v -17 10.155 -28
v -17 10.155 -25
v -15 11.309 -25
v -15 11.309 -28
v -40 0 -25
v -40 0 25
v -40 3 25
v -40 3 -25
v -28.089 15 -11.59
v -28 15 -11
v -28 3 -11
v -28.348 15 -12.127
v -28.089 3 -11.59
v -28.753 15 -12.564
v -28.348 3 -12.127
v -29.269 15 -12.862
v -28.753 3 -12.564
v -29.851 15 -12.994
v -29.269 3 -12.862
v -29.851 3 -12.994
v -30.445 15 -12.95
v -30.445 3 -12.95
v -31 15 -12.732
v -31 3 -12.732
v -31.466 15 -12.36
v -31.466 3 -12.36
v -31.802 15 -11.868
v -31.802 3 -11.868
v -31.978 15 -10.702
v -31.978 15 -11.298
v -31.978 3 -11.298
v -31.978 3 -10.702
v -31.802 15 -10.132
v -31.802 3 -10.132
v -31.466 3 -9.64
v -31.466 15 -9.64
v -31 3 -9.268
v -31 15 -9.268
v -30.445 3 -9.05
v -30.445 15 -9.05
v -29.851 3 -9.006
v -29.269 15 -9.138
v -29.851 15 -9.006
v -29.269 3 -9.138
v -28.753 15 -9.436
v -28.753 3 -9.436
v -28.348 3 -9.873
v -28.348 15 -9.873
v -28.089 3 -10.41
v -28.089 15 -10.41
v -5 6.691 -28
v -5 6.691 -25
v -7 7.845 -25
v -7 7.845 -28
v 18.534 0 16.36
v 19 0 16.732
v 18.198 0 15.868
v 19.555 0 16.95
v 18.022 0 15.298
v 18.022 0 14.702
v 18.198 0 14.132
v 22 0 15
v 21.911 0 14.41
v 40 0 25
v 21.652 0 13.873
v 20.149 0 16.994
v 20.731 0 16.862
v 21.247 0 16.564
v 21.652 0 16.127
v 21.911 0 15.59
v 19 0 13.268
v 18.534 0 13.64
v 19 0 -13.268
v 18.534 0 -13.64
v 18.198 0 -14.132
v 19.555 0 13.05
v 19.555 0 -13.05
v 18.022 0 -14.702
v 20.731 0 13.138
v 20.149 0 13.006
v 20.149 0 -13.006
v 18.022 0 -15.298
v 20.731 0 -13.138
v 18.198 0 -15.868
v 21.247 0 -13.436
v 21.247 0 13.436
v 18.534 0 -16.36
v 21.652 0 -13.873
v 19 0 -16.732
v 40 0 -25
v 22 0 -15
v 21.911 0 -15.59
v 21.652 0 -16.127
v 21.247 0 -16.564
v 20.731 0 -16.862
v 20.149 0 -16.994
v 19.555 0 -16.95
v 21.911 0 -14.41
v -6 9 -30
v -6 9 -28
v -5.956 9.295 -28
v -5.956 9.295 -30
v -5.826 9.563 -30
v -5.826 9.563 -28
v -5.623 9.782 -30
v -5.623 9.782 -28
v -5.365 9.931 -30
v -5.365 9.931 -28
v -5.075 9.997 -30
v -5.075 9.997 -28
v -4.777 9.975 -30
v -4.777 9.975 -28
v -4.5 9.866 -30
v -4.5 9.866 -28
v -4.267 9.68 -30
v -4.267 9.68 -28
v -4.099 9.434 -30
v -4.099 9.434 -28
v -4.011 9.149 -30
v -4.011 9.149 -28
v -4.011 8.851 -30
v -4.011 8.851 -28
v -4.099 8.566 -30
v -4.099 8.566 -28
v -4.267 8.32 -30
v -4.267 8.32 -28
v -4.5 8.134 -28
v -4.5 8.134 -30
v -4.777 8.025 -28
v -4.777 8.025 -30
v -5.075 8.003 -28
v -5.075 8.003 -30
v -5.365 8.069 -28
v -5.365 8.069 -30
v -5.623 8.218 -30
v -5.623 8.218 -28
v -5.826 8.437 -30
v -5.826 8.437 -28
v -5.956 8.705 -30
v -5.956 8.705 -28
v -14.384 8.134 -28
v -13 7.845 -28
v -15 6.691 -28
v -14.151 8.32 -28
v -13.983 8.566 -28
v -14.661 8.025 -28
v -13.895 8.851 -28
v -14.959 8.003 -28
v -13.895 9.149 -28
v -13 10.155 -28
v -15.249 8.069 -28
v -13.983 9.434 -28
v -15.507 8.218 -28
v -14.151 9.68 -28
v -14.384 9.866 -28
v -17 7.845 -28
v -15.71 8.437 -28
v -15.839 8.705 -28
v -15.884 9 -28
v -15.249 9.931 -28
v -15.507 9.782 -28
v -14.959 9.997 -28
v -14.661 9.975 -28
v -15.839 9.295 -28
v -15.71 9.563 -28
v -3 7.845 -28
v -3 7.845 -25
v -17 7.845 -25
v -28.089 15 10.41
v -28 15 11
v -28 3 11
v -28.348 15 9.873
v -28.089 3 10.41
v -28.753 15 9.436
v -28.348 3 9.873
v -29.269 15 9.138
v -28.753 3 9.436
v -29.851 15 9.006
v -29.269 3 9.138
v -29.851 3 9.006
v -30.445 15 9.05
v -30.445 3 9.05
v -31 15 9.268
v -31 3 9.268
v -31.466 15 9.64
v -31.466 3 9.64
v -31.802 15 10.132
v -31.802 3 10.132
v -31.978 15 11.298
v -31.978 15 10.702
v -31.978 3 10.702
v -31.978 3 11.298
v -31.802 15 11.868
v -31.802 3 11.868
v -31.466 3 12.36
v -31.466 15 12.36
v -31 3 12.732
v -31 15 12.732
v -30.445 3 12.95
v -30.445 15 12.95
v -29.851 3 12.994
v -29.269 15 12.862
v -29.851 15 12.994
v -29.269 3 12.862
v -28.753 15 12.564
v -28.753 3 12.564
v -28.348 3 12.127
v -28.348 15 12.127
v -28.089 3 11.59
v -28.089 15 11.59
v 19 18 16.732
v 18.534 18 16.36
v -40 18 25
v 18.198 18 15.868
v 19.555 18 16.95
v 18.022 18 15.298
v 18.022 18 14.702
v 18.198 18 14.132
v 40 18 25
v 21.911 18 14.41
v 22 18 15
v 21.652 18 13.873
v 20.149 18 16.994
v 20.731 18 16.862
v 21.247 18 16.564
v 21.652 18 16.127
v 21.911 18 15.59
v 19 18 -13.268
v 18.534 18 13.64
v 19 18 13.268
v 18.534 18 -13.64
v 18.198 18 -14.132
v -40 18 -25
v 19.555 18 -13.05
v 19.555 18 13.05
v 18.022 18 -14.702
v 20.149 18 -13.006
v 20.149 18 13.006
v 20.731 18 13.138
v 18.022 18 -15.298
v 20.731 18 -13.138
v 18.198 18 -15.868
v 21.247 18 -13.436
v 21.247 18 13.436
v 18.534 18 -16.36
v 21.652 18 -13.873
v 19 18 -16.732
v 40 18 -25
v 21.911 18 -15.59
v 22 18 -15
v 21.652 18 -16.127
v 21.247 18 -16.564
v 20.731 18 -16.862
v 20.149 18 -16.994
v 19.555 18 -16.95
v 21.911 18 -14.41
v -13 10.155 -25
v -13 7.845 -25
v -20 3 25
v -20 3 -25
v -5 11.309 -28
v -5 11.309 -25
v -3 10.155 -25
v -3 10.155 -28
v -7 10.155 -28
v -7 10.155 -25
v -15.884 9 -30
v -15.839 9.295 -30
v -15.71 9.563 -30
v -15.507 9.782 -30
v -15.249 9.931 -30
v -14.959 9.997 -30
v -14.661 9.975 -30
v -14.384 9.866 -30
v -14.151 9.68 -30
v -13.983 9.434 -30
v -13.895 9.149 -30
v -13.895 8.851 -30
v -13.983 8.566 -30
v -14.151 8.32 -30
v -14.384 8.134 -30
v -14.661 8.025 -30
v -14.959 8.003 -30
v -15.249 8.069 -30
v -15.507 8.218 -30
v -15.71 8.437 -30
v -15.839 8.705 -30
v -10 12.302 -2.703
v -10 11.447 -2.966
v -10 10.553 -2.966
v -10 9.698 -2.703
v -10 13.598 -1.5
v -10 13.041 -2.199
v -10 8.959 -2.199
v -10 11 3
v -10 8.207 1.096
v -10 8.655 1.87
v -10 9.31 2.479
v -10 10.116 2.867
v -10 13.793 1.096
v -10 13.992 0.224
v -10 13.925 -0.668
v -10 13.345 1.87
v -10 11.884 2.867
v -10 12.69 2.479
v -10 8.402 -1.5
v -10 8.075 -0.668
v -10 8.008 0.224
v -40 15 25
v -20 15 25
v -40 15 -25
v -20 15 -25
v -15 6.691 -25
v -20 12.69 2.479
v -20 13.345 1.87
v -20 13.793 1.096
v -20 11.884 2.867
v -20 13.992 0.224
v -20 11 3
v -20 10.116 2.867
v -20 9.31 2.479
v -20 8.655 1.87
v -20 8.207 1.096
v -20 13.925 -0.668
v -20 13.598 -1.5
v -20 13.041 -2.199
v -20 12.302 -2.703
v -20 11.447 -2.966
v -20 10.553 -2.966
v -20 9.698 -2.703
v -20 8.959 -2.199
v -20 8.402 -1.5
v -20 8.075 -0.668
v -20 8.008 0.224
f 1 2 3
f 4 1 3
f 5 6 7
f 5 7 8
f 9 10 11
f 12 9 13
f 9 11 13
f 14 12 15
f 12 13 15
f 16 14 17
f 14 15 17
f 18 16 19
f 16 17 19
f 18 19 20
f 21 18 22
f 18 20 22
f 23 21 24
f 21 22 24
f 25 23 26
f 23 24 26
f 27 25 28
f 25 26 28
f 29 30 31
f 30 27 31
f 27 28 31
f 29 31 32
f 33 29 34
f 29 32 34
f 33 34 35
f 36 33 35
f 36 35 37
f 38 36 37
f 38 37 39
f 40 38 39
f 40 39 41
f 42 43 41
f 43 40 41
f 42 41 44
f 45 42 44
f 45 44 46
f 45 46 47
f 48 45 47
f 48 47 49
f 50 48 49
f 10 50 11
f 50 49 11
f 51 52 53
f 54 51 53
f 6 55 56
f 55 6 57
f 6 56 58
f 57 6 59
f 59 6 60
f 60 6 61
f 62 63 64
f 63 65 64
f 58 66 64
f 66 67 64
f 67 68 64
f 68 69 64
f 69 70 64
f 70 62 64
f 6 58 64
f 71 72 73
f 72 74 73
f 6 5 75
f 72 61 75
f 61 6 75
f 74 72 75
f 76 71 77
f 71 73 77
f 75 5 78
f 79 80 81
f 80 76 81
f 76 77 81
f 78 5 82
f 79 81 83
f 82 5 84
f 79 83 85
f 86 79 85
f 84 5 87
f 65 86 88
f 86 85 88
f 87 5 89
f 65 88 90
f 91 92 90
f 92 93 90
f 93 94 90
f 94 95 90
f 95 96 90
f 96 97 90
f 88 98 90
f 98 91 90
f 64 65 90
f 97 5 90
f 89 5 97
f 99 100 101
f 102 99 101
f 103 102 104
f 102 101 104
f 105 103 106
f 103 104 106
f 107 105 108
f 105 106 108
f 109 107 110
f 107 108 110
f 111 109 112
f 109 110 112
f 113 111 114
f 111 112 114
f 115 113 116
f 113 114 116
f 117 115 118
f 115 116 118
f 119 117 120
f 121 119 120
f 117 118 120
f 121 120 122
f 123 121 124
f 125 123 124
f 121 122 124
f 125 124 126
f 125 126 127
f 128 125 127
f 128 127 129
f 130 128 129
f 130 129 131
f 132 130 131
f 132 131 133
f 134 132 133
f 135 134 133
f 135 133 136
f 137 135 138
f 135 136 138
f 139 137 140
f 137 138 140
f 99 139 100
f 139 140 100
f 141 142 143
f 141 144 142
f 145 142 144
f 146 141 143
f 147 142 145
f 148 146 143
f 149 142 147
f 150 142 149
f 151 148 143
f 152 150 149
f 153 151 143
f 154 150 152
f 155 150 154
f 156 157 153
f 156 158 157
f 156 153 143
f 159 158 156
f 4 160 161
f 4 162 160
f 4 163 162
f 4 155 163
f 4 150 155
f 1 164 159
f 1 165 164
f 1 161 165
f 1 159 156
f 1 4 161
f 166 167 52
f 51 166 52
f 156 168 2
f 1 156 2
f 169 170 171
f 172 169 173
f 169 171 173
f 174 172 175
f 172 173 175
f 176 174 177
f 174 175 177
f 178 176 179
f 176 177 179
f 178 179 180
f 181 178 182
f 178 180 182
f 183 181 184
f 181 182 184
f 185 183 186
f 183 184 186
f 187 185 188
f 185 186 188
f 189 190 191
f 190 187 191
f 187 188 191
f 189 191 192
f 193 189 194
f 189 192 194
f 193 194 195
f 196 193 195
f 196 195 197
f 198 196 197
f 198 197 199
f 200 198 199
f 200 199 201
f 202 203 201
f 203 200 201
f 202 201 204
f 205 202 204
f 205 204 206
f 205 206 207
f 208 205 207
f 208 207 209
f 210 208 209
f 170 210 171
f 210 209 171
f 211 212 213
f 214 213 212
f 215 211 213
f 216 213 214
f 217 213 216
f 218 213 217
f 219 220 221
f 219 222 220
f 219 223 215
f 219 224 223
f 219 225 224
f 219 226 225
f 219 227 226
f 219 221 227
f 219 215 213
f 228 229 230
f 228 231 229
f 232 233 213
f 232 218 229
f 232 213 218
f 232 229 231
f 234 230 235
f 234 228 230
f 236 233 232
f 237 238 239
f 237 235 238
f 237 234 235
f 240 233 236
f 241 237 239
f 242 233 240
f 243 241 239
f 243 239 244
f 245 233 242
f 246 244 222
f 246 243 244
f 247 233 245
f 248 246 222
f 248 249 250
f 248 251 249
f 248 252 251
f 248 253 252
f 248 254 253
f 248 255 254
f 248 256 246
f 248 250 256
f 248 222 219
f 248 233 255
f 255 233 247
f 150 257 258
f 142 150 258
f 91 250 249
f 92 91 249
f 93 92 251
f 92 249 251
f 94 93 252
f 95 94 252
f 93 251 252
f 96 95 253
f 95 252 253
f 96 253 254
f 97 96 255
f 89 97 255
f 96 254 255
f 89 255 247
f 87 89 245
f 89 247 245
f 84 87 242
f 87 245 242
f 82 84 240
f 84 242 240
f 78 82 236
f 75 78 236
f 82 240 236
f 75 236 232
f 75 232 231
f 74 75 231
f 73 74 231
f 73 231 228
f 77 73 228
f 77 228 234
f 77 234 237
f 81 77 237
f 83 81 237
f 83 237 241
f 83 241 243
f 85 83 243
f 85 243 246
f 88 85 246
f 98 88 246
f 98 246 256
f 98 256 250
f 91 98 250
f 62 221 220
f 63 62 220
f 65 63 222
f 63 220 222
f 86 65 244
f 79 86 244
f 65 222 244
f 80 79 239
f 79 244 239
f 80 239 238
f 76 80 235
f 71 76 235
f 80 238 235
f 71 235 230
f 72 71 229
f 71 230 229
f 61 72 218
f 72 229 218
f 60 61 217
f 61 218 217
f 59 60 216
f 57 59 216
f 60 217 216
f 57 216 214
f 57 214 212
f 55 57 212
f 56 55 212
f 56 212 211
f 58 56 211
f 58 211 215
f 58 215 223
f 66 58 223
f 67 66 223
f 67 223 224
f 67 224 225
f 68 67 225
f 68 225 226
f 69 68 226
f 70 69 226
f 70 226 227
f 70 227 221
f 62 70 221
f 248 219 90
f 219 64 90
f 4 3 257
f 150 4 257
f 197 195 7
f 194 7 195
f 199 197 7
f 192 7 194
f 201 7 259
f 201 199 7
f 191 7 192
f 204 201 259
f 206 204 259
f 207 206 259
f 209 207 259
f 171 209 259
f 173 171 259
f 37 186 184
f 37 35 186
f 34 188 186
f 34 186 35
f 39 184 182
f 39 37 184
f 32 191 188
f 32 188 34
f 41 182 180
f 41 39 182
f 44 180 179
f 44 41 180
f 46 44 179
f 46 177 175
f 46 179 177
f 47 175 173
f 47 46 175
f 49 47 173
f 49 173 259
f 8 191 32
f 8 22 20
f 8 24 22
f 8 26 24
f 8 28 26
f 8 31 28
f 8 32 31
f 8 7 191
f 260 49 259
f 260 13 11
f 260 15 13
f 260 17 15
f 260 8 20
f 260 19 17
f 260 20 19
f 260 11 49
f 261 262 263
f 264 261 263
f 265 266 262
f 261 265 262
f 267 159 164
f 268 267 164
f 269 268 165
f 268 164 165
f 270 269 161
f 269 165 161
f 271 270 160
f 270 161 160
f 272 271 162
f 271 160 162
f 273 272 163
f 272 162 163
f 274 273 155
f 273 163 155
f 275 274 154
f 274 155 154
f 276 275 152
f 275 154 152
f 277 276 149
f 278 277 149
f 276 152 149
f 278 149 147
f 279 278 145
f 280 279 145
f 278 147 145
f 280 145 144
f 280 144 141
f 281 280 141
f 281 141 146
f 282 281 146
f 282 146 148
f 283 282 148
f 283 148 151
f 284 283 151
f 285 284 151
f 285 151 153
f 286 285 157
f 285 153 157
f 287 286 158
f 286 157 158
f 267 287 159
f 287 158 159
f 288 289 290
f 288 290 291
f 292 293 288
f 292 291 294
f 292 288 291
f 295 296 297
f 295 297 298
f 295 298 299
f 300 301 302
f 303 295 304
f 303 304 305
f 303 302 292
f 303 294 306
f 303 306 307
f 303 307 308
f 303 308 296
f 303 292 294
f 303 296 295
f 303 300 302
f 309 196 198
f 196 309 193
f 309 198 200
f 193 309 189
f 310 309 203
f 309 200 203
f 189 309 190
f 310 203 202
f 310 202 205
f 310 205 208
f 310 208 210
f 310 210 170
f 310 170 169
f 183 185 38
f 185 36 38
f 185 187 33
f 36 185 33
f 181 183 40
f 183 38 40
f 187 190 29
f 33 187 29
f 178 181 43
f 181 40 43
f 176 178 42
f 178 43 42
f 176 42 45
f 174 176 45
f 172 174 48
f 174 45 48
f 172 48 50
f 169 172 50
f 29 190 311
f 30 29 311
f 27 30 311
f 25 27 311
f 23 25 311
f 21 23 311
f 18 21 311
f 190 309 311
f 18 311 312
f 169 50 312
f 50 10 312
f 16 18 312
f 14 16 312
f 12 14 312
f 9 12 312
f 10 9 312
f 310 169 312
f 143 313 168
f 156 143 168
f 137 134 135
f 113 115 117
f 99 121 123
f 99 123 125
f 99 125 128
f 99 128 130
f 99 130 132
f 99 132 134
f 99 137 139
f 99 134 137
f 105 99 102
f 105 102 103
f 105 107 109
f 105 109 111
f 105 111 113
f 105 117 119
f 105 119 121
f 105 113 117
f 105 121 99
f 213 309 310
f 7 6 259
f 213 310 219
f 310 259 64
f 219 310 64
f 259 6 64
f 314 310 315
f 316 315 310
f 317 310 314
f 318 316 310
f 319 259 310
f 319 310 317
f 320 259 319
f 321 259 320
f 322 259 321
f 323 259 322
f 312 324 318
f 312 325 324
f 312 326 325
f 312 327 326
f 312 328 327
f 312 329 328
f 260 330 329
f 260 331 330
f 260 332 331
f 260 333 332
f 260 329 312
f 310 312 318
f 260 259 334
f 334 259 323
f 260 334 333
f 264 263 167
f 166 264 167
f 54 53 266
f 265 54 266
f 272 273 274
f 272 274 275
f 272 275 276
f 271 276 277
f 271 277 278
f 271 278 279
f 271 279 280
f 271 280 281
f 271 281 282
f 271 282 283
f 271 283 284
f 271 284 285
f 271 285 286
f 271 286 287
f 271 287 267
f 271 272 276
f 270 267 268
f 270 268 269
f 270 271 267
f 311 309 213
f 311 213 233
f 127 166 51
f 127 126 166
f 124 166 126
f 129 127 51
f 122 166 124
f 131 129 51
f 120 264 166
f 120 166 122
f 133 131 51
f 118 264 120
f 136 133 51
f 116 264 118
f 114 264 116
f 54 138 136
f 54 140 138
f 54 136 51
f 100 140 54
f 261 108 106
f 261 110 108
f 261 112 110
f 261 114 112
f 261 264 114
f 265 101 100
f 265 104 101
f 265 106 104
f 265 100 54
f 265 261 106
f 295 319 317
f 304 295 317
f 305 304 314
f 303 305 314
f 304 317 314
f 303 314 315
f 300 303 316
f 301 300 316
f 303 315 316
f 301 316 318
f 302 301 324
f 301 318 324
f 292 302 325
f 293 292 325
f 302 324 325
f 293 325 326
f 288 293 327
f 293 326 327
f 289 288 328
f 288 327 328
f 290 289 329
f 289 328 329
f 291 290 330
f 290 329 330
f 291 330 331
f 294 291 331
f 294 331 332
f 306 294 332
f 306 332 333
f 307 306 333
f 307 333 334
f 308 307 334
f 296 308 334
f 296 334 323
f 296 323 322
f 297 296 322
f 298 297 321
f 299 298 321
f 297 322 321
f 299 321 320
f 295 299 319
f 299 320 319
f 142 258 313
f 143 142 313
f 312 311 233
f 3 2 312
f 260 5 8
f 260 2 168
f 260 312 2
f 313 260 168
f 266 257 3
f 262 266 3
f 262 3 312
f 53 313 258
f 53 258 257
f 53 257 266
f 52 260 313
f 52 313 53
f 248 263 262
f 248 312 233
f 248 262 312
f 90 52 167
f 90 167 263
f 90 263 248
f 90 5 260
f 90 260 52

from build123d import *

# Parameters (mm, degrees)
SKETCH1_W           = 80
SKETCH1_H           = 50
BOSS_EXTRUDE1_DEPTH = 3
SKETCH2_R           = 2
BOSS_EXTRUDE2_DEPTH = 14
SKETCH3_W           = 60
SKETCH3_H           = 50
BOSS_EXTRUDE3_DEPTH = 12
SKETCH4_R           = 3
CUT_EXTRUDE1_DEPTH  = 10
SKETCH5_W           = 80
SKETCH5_H           = 50
BOSS_EXTRUDE4_DEPTH = 3
SKETCH6_R           = 2
CUT_EXTRUDE2_DEPTH  = 49
BOSS_EXTRUDE5_DEPTH = 3
SKETCH8_R           = 1
BOSS_EXTRUDE6_DEPTH = 2


with BuildPart() as part:
    # Sketch1 → Boss-Extrude1 (new body)
    with BuildSketch(Plane(origin=(0, 0, 0), x_dir=(1, 0, 0), z_dir=(0, 1, 0))):
        Rectangle(SKETCH1_W, SKETCH1_H)
    extrude(amount=BOSS_EXTRUDE1_DEPTH)

    # Sketch2 → Boss-Extrude2 (add)
    with BuildSketch(Plane(origin=(0, 3, 0), x_dir=(1, 0, 0), z_dir=(0, 1, 0))):
        with Locations((-30, 11)):
            Circle(SKETCH2_R)
        with Locations((-30, -11)):
            Circle(SKETCH2_R)
    extrude(amount=BOSS_EXTRUDE2_DEPTH)

    # Sketch3 → Boss-Extrude3 (add)
    with BuildSketch(Plane(origin=(0, 3, 0), x_dir=(1, 0, 0), z_dir=(0, 1, 0))):
        with Locations((10, 0)):
            Rectangle(SKETCH3_W, SKETCH3_H)
    extrude(amount=BOSS_EXTRUDE3_DEPTH)

    # Sketch4 → Cut-Extrude1 (cut)
    with BuildSketch(Plane.ZY.offset(20)):
        with Locations((0, 11)):
            Circle(SKETCH4_R)
    extrude(amount=-CUT_EXTRUDE1_DEPTH, mode=Mode.SUBTRACT)

    # Sketch5 → Boss-Extrude4 (add)
    with BuildSketch(Plane(origin=(0, 15, 0), x_dir=(1, 0, 0), z_dir=(0, 1, 0))):
        Rectangle(SKETCH5_W, SKETCH5_H)
    extrude(amount=BOSS_EXTRUDE4_DEPTH)

    # Sketch6 → Cut-Extrude2 (cut)
    with BuildSketch(Plane(origin=(0, 18, 0), x_dir=(1, 0, 0), z_dir=(0, 1, 0))):
        with Locations((20, 15)):
            Circle(SKETCH6_R)
        with Locations((20, -15)):
            Circle(SKETCH6_R)
    extrude(amount=-CUT_EXTRUDE2_DEPTH, mode=Mode.SUBTRACT)

    # Sketch7 → Boss-Extrude5 (add)
    with BuildSketch(Plane(origin=(0, 0, -25), x_dir=(-1, 0, 0), z_dir=(0, 0, -1))):
        Polygon((15, 11.309401077), (13, 10.154700538), (13, 7.845299462), (15, 6.690598923), (17, 7.845299462), (17, 10.154700538), align=None)
        Polygon((5, 11.309401077), (3, 10.154700538), (3, 7.845299462), (5, 6.690598923), (7, 7.845299462), (7, 10.154700538), align=None)
    extrude(amount=BOSS_EXTRUDE5_DEPTH)

    # Sketch8 → Boss-Extrude6 (add)
    with BuildSketch(Plane(origin=(0, 0, -28), x_dir=(-1, 0, 0), z_dir=(0, 0, -1))):
        with Locations((14.883913009, 9)):
            Circle(SKETCH8_R)
        with Locations((5, 9)):
            Circle(SKETCH8_R)
    extrude(amount=BOSS_EXTRUDE6_DEPTH)


solid = part.part
